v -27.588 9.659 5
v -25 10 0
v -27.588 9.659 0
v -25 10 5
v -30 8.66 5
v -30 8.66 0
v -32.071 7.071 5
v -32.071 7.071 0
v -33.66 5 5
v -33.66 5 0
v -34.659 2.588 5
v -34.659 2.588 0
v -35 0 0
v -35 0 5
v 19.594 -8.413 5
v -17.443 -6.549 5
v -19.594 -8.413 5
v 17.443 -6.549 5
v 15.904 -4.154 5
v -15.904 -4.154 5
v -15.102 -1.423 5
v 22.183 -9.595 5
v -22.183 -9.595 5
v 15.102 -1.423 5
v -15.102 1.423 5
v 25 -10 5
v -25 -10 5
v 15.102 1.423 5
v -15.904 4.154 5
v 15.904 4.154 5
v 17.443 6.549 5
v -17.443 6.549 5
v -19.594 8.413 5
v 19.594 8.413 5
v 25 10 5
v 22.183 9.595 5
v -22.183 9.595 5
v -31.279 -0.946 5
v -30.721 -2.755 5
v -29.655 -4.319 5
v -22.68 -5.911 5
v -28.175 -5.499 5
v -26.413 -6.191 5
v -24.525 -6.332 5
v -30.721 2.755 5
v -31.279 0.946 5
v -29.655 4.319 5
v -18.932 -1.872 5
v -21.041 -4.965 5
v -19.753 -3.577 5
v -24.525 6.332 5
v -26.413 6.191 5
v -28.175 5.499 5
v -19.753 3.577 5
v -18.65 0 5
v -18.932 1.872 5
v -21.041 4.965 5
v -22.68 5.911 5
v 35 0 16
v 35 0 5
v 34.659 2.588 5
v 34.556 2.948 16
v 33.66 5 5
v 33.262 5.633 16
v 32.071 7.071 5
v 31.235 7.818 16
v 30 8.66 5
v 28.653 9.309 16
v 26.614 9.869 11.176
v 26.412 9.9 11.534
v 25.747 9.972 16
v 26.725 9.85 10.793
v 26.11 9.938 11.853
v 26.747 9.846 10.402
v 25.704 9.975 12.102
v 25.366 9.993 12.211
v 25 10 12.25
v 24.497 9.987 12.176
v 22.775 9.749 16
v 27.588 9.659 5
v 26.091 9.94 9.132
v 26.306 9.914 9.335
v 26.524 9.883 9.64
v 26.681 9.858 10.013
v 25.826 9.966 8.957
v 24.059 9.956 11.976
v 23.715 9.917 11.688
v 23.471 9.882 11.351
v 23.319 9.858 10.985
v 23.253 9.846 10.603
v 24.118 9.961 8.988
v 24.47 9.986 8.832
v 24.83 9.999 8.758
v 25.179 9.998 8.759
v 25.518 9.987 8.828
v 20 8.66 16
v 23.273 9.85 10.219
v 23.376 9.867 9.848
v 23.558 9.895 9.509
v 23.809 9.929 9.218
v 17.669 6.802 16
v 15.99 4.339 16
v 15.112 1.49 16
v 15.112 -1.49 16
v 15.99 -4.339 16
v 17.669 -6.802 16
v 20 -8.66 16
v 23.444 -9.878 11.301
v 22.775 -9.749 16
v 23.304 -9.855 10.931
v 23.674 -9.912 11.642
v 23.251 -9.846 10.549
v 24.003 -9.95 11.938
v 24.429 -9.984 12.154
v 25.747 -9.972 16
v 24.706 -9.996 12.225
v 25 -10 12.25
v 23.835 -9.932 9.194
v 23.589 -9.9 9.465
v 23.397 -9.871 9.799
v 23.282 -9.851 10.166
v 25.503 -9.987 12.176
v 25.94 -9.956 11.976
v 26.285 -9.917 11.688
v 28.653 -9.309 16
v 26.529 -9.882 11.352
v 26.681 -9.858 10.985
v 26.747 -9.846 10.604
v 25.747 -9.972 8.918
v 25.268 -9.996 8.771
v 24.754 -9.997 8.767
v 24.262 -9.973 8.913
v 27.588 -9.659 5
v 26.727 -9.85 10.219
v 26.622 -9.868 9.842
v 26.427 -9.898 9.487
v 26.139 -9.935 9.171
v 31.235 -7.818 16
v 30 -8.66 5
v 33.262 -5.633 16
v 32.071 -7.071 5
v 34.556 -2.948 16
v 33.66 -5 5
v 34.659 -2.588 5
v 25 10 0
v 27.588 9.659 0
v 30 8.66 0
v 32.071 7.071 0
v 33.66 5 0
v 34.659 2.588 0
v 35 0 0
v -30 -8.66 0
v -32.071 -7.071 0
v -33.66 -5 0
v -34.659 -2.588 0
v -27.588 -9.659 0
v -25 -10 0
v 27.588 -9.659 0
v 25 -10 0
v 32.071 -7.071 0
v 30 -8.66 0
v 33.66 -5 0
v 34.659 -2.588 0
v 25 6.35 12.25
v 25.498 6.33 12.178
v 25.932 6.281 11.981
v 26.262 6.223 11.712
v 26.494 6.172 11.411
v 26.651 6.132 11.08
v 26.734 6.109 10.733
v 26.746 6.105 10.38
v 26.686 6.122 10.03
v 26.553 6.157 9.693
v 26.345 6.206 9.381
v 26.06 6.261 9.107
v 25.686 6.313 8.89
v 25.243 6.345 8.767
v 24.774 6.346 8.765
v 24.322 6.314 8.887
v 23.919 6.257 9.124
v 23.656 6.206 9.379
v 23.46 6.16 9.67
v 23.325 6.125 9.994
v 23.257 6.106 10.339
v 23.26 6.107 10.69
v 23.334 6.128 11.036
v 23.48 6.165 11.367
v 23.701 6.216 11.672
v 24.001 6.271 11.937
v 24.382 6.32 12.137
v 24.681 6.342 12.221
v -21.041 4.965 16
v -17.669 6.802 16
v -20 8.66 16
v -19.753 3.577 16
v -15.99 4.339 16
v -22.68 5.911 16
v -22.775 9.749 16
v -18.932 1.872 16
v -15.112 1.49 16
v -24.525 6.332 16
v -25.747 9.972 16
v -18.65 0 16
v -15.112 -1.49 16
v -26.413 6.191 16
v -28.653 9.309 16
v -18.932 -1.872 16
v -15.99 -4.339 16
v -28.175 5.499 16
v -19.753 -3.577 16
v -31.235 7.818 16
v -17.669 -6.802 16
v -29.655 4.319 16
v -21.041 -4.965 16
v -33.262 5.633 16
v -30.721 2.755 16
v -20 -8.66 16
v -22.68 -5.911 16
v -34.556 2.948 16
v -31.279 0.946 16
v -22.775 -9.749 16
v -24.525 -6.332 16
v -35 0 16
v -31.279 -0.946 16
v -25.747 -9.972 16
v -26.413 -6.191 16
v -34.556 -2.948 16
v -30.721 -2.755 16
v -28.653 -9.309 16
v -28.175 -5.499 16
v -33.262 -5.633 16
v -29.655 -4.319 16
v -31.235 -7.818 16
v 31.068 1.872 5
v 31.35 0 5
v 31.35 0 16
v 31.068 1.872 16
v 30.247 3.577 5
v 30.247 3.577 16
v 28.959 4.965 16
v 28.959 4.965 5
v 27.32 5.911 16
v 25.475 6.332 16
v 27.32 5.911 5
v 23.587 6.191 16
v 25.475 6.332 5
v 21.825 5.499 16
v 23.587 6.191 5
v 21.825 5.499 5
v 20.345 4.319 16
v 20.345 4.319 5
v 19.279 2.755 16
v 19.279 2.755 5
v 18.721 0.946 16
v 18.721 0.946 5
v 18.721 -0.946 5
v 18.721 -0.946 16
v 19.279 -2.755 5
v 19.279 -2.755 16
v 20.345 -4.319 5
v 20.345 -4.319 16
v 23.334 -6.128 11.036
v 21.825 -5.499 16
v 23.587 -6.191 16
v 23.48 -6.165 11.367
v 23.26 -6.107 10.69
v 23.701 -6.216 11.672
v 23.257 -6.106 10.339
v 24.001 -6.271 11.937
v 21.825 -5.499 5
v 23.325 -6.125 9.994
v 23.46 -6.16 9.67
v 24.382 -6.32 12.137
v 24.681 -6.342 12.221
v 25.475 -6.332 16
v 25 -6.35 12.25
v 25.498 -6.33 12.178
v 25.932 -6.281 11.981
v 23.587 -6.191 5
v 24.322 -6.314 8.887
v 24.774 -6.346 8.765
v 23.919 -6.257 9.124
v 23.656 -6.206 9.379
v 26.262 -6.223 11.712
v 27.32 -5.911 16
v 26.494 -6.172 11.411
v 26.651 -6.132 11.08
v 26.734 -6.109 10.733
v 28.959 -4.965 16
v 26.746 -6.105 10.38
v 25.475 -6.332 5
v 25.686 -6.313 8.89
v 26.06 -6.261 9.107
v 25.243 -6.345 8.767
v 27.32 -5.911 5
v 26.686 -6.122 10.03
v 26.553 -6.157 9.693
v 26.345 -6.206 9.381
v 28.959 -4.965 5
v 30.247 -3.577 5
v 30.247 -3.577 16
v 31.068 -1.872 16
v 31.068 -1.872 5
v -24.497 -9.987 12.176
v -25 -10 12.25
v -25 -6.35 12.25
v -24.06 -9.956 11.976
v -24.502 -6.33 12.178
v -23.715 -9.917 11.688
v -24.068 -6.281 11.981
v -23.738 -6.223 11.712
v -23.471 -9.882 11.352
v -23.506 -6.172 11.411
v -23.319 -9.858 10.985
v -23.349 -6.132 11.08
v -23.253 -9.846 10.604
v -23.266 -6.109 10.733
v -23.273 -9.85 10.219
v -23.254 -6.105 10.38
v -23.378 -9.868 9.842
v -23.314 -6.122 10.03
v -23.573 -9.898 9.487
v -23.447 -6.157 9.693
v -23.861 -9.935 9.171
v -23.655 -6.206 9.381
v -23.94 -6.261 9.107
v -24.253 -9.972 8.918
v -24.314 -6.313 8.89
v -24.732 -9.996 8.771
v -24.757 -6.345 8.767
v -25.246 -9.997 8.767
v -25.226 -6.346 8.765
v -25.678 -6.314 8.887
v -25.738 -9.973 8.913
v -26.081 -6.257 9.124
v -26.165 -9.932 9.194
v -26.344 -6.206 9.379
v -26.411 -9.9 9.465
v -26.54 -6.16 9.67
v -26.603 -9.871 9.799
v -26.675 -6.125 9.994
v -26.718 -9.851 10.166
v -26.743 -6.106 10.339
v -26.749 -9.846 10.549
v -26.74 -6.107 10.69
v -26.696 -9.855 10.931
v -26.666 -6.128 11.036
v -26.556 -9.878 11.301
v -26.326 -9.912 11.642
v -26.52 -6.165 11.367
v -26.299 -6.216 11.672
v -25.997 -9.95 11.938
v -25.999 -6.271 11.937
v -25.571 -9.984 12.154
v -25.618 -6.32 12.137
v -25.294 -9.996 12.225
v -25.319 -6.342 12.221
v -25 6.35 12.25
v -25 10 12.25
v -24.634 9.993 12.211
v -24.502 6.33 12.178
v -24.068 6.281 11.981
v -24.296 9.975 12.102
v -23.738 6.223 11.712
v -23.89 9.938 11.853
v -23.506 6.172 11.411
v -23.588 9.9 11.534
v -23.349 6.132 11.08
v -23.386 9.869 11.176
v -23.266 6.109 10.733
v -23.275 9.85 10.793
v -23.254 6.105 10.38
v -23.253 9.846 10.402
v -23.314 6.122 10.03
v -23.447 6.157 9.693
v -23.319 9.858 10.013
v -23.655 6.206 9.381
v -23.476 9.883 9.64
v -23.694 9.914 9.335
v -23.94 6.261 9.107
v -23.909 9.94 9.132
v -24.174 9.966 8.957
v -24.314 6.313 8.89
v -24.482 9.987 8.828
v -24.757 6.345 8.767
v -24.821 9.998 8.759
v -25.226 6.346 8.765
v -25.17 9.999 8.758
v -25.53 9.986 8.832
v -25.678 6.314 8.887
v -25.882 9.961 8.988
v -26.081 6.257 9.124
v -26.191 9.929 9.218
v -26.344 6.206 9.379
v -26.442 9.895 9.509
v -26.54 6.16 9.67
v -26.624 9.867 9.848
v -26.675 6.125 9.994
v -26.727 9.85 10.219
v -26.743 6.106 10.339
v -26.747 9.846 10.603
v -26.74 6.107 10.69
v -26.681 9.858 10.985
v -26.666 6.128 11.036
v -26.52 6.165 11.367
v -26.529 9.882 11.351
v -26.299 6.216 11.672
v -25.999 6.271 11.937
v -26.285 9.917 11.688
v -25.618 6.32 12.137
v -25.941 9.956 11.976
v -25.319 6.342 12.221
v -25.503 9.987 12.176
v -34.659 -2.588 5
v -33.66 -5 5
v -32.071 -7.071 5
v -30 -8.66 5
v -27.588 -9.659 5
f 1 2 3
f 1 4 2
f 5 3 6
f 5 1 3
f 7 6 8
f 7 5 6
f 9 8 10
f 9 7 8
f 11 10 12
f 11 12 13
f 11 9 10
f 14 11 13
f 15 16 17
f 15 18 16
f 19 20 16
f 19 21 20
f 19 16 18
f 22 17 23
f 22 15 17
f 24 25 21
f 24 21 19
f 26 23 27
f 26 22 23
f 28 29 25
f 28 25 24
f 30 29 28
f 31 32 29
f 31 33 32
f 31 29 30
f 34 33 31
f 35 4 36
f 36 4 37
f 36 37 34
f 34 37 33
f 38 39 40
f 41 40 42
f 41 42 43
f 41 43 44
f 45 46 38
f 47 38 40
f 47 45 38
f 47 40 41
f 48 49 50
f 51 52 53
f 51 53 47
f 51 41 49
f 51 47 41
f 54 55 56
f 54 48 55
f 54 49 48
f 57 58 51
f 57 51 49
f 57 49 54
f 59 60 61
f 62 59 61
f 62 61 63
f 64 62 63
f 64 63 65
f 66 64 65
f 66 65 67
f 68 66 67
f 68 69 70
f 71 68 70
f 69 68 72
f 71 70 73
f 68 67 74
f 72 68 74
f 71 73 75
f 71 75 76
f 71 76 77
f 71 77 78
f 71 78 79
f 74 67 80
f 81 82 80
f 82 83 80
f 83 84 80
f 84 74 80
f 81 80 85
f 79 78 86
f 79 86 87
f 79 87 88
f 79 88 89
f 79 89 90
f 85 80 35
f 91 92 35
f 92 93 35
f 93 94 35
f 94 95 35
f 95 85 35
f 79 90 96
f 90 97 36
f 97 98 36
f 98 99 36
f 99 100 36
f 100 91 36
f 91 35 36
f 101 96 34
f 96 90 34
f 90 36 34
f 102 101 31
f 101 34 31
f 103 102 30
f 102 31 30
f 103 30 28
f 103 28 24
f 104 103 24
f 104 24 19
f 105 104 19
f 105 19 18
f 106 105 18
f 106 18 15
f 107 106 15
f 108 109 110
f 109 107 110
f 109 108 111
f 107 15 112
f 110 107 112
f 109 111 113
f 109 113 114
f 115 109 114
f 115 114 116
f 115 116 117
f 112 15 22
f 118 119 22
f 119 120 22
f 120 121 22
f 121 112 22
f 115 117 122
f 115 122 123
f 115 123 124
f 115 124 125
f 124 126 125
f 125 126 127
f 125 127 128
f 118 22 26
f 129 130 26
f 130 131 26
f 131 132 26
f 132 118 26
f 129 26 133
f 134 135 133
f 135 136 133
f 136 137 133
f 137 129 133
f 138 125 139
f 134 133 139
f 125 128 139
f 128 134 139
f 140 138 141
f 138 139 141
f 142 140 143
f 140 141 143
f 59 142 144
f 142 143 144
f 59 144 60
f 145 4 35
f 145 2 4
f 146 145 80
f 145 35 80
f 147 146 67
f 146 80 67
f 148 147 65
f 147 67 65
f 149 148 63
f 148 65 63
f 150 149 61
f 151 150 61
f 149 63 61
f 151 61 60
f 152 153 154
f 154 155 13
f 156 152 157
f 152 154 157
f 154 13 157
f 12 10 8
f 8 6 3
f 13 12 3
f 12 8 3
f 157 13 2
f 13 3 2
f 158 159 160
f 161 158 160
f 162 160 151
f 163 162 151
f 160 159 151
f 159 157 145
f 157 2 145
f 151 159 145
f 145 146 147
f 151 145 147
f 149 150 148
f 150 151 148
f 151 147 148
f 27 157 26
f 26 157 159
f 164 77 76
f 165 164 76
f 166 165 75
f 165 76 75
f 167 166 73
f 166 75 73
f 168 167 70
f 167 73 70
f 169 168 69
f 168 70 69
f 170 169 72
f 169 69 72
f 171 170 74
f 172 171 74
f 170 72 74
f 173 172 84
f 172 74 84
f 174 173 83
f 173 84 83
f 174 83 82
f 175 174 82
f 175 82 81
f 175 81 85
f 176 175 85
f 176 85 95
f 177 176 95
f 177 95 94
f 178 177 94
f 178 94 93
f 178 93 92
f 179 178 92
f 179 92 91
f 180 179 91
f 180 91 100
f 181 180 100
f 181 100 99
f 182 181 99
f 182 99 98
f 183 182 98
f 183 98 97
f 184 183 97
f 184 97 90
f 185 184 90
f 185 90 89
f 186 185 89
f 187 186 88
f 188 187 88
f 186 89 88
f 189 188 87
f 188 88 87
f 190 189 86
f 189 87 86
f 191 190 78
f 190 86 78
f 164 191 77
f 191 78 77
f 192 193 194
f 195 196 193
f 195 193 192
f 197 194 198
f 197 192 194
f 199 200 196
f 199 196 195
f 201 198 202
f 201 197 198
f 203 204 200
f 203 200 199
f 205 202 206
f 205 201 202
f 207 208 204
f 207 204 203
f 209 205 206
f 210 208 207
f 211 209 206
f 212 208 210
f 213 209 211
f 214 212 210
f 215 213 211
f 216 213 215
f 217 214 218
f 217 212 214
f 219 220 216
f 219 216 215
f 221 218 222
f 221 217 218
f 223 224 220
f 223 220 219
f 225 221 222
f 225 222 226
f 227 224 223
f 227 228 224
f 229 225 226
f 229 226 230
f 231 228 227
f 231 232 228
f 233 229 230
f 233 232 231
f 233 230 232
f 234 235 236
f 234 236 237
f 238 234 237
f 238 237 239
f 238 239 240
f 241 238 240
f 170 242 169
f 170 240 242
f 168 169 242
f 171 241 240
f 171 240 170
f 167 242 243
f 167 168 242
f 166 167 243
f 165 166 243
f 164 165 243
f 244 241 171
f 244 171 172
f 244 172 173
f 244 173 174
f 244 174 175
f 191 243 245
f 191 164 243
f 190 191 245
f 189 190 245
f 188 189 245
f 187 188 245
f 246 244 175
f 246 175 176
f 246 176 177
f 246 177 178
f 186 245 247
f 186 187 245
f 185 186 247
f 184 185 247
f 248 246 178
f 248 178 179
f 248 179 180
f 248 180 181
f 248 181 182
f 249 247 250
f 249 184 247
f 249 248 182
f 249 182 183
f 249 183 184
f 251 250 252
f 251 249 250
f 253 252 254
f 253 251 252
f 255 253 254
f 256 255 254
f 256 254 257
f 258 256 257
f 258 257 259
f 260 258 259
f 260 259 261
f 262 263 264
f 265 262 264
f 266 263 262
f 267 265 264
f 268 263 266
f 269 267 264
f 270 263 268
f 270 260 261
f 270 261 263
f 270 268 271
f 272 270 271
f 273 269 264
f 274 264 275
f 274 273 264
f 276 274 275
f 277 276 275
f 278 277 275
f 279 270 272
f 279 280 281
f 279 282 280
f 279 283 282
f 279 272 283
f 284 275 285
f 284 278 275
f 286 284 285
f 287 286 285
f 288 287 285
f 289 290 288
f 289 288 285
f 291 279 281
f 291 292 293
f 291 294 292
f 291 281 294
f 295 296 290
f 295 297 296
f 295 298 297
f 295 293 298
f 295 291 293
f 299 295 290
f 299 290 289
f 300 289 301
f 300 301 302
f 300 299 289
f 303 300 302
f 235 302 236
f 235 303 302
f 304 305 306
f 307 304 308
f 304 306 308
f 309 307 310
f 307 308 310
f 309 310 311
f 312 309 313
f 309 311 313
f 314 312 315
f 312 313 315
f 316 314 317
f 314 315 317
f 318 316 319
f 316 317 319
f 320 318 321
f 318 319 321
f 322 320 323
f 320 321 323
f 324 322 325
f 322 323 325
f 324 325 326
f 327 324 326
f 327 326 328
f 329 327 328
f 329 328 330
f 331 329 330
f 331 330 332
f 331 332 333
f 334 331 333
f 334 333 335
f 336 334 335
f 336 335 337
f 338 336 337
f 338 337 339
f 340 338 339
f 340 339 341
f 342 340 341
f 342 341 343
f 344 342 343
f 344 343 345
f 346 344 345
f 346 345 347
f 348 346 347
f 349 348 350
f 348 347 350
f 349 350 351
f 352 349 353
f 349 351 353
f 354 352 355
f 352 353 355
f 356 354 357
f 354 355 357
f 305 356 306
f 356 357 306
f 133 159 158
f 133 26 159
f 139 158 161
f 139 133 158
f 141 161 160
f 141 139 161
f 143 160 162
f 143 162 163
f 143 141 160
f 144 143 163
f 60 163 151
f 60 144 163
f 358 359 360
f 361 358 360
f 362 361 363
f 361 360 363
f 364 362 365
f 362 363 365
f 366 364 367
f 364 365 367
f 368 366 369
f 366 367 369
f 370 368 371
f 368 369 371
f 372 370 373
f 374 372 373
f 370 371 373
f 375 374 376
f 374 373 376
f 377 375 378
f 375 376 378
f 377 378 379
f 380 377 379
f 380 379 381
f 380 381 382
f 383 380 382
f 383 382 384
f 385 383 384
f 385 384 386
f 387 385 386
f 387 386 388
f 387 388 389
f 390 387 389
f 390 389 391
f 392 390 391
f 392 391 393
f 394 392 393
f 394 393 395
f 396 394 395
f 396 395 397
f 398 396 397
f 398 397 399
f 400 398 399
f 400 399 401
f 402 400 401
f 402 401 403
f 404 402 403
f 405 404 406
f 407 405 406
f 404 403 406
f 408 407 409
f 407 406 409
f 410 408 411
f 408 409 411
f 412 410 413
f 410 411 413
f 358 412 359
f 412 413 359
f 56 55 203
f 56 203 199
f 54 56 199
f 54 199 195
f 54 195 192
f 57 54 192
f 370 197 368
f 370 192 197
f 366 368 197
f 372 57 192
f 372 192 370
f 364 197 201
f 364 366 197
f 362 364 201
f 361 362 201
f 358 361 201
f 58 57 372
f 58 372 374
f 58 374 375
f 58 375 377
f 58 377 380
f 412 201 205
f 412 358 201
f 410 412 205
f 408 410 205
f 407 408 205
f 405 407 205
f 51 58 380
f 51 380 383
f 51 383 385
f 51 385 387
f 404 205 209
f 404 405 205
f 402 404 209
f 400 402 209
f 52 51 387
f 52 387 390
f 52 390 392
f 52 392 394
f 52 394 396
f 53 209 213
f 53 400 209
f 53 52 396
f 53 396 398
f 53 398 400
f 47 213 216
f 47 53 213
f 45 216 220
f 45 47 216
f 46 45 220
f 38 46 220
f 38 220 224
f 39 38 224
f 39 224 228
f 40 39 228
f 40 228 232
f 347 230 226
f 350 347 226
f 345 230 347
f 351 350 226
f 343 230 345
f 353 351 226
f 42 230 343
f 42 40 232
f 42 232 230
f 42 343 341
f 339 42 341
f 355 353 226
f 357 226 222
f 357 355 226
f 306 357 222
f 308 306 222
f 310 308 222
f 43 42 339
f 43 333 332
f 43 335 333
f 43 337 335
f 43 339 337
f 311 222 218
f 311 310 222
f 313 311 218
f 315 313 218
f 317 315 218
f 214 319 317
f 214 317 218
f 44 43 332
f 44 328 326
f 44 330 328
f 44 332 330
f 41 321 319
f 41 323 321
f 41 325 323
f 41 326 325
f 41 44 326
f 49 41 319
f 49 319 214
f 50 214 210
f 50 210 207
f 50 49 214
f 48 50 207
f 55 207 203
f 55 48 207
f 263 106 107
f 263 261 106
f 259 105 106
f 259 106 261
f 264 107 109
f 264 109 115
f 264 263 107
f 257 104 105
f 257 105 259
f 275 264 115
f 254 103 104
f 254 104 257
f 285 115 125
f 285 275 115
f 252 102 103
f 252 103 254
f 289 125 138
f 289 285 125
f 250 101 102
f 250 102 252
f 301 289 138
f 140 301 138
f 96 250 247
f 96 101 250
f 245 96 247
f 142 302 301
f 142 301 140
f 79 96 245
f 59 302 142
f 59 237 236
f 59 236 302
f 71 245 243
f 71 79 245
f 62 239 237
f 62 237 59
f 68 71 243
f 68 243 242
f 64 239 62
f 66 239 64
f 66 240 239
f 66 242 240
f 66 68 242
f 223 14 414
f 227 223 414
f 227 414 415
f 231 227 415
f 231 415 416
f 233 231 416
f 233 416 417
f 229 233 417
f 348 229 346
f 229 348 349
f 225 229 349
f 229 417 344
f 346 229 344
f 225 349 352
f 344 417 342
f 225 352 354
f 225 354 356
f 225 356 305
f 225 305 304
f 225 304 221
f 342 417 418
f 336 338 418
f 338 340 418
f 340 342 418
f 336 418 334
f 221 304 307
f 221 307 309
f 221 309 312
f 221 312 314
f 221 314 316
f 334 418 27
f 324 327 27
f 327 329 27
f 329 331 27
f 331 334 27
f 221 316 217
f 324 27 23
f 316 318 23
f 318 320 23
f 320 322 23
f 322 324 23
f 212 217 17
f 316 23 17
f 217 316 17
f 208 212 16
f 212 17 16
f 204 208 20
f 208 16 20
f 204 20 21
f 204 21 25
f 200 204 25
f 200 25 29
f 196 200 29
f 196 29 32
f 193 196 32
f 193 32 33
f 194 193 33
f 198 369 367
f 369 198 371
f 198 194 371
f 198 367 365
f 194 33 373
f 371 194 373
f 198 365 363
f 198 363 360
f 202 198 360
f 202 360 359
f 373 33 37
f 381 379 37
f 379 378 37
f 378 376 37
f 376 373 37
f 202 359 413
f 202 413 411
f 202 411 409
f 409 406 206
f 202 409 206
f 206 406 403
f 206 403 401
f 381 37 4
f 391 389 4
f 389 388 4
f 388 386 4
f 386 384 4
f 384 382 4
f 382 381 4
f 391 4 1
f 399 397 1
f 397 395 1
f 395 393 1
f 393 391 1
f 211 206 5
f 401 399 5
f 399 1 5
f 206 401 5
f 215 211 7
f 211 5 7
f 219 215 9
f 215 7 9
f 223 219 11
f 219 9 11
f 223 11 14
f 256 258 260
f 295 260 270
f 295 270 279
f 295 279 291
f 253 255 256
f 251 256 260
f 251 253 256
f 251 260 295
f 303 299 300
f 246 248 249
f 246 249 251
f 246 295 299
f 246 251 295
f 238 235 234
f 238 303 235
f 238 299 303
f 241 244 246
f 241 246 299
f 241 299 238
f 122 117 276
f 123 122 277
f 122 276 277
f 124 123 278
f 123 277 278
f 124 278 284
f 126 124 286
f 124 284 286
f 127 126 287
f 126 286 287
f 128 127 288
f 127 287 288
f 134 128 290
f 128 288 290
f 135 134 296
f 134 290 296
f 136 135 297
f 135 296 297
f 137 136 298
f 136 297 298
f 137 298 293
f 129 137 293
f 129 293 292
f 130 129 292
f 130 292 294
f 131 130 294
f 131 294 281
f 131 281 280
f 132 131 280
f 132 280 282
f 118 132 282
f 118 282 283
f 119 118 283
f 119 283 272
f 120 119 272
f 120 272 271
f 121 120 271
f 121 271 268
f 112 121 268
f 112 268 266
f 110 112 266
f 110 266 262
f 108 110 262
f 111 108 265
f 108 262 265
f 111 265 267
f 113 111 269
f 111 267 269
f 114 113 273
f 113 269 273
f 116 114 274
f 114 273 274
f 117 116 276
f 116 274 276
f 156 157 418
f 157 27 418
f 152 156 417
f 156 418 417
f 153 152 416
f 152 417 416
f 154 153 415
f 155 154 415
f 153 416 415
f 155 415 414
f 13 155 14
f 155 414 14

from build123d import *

# Parameters (mm, degrees)
SKETCH1_W           = 70
SKETCH1_H           = 20
BOSS_EXTRUDE1_DEPTH = 5
SKETCH2_R           = 10
SKETCH2_R_2         = 6.35
BOSS_EXTRUDE2_DEPTH = 11
SKETCH3_R           = 1.75
CUT_EXTRUDE1_DEPTH  = 44.370496884
FILLET1_R           = 10


with BuildPart() as part:
    # Sketch1 → Boss-Extrude1 (new body)
    with BuildSketch(Plane.XY):
        Rectangle(SKETCH1_W, SKETCH1_H)
    extrude(amount=BOSS_EXTRUDE1_DEPTH)

    # Sketch2 → Boss-Extrude2 (add)
    # profile 1 of 2: a face of its own
    with BuildSketch(Plane.XY.offset(5)):
        with Locations(Location((-25, 0, 0), (0, 0, 180))):
            Circle(SKETCH2_R)
        with Locations((-25, 0)):
            Circle(SKETCH2_R_2, mode=Mode.SUBTRACT)
    # profile 2 of 2: a face of its own
    with BuildSketch(Plane.XY.offset(5)):
        with Locations((25, 0)):
            Circle(SKETCH2_R)
        with Locations((25, 0)):
            Circle(SKETCH2_R_2, mode=Mode.SUBTRACT)
    extrude(amount=BOSS_EXTRUDE2_DEPTH)

    # Sketch3 → Cut-Extrude1 (cut, through all)
    with BuildSketch(Plane(origin=(0, 10, 0), x_dir=(1, 0, 0), z_dir=(0, 1, 0))):
        with Locations(Location((-25, -10.5, 0), (0, 0, 270))):
            Circle(SKETCH3_R)
        with Locations(Location((25, -10.5, 0), (0, 0, 270))):
            Circle(SKETCH3_R)
    extrude(amount=-CUT_EXTRUDE1_DEPTH, mode=Mode.SUBTRACT)

    # Fillet1
    fillet1_edges = [part.edges().sort_by_distance(p)[0] for p in [
        (-35, -10, 2.5),
        (-35, 10, 2.5),
        (35, 10, 2.5),
        (35, -10, 2.5),
    ]]
    fillet(fillet1_edges, radius=FILLET1_R - 0.0001)  # a hair under: the kernel refuses the full size


solid = part.part
